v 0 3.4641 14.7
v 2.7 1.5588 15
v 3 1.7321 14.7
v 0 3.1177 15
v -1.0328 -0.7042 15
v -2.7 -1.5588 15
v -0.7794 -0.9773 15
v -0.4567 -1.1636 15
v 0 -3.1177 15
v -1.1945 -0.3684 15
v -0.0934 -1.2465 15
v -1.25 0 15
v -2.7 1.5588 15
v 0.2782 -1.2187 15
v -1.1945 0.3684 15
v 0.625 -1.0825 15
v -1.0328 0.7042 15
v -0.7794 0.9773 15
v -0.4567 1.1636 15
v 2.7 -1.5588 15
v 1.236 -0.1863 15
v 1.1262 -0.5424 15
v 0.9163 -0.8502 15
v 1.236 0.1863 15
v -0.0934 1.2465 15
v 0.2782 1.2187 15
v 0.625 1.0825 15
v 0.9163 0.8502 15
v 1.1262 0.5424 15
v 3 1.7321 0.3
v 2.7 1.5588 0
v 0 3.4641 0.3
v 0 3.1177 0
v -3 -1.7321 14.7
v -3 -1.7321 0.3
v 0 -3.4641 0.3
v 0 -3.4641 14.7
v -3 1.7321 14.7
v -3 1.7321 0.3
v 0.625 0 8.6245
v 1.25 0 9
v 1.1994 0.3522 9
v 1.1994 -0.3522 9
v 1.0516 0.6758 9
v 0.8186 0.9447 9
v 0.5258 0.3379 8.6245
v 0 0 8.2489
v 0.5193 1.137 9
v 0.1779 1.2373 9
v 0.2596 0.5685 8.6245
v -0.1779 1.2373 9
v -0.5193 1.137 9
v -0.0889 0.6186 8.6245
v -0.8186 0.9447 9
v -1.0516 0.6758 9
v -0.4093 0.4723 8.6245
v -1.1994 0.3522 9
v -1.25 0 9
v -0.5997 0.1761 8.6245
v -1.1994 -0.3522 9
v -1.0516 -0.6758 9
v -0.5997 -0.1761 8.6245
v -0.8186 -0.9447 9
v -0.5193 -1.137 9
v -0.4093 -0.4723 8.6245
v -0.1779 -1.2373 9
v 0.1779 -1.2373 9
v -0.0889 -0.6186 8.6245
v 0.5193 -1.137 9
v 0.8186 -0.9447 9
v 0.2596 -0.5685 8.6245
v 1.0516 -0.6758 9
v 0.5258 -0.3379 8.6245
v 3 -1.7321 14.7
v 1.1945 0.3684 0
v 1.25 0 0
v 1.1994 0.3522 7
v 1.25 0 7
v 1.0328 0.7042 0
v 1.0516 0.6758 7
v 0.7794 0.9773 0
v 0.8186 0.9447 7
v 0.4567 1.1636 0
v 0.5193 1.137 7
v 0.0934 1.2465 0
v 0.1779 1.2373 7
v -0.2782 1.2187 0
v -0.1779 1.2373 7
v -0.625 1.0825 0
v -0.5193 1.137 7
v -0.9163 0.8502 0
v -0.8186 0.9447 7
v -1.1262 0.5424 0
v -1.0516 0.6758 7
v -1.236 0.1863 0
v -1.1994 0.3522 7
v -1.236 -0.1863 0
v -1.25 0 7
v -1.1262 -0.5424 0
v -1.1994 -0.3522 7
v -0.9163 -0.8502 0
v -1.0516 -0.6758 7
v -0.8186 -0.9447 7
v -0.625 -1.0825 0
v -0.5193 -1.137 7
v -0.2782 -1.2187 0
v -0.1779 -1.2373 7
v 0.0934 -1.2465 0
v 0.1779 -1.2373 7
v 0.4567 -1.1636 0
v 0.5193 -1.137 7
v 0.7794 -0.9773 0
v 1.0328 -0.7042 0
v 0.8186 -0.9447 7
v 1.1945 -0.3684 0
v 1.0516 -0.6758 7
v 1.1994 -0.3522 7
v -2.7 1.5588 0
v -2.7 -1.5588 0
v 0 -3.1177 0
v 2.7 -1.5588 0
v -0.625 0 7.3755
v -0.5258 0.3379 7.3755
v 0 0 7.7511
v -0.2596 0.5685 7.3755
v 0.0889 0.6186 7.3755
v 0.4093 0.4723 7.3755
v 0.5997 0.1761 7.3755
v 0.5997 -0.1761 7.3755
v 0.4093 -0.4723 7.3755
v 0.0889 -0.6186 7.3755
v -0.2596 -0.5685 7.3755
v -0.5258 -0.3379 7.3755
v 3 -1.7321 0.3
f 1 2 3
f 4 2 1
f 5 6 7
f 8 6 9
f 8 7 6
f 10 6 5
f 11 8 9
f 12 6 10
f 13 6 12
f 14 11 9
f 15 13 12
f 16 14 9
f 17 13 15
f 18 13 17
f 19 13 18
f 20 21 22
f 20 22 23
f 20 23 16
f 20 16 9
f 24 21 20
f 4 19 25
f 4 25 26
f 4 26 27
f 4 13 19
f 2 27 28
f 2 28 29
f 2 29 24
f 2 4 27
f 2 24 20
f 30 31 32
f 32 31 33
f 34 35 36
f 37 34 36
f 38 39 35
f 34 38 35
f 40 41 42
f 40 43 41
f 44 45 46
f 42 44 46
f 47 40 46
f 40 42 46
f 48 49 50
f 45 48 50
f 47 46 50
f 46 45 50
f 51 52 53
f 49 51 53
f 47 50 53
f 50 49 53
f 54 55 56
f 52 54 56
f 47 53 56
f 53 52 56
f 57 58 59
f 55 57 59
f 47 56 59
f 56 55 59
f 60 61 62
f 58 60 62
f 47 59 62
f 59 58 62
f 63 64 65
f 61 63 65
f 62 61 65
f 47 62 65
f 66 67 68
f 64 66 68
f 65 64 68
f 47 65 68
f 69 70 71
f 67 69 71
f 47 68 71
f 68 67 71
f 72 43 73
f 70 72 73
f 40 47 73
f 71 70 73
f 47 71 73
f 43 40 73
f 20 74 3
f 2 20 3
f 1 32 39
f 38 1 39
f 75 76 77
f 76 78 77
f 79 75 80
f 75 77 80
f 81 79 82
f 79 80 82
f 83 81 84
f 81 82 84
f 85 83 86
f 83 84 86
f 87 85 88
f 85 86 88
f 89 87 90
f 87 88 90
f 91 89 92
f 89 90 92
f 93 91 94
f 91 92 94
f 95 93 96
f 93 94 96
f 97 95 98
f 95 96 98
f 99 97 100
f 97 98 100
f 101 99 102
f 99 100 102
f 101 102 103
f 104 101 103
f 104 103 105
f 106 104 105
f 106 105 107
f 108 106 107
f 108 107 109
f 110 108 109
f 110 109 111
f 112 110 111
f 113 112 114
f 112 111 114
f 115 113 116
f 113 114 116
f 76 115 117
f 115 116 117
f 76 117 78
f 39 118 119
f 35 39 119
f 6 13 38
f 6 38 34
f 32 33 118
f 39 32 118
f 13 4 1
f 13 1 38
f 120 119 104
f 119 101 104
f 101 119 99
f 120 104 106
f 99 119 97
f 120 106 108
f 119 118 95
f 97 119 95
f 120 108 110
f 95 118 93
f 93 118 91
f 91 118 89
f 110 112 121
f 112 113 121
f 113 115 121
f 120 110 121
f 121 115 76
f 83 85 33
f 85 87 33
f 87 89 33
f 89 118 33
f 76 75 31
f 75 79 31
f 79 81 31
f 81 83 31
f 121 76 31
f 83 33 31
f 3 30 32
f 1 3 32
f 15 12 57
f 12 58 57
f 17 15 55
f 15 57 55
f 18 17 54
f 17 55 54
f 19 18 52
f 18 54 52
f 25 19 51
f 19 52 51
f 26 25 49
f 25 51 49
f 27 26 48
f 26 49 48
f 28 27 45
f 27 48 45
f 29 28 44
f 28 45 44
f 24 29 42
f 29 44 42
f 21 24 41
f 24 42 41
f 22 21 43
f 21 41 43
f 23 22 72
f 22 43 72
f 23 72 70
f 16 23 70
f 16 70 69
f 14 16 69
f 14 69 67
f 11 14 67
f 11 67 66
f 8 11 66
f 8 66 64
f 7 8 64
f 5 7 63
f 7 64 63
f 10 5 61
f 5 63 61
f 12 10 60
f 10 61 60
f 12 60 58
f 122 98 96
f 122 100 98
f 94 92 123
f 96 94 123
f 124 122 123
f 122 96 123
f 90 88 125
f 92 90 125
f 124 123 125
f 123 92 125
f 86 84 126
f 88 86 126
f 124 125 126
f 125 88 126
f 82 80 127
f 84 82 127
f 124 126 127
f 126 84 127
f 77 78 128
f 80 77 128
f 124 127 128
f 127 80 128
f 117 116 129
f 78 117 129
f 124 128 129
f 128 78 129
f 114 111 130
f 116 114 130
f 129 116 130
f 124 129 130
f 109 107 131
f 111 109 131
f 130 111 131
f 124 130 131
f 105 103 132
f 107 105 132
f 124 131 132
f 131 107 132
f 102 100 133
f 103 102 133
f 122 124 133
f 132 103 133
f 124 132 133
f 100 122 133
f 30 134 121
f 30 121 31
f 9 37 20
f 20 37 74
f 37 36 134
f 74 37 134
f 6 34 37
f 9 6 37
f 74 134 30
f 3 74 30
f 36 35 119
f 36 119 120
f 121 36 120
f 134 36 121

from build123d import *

# Parameters (mm, degrees)
BOSS_EXTRUDE1_DEPTH   = 15
M3_TAPPED_HOLE1_D     = 2.5
M3_TAPPED_HOLE1_DEPTH = 6
M3_TAPPED_HOLE1_TIP   = 0.751075774
M3_TAPPED_HOLE2_D     = 2.5
M3_TAPPED_HOLE2_DEPTH = 7
M3_TAPPED_HOLE2_TIP   = 0.751075774
CHAMFER1_SIZE         = 0.3


with BuildPart() as part:
    # Sketch1 → Boss-Extrude1 (new body)
    with BuildSketch(Plane.XY):
        Polygon((0, 3.464101615), (-3, 1.732050808), (-3, -1.732050808), (0, -3.464101615), (3, -1.732050808), (3, 1.732050808), align=None)
    extrude(amount=BOSS_EXTRUDE1_DEPTH)

    # M3 Tapped Hole1
    with Locations(Plane.XY.offset(15)):
        with Locations((0, 0)):
            Hole(M3_TAPPED_HOLE1_D / 2, depth=M3_TAPPED_HOLE1_DEPTH)
            with Locations((0, 0, -(M3_TAPPED_HOLE1_DEPTH + M3_TAPPED_HOLE1_TIP / 2))):  # 118° drill point
                Cone(0, M3_TAPPED_HOLE1_D / 2, M3_TAPPED_HOLE1_TIP, mode=Mode.SUBTRACT)

    # M3 Tapped Hole2
    with Locations(Plane(origin=(0, 0, 0), x_dir=(-1, 0, 0), z_dir=(0, 0, -1))):
        with Locations((0, 0)):
            Hole(M3_TAPPED_HOLE2_D / 2, depth=M3_TAPPED_HOLE2_DEPTH)
            with Locations((0, 0, -(M3_TAPPED_HOLE2_DEPTH + M3_TAPPED_HOLE2_TIP / 2))):  # 118° drill point
                Cone(0, M3_TAPPED_HOLE2_D / 2, M3_TAPPED_HOLE2_TIP, mode=Mode.SUBTRACT)

    # Chamfer1
    chamfer1_edges = [part.edges().sort_by_distance(p)[0] for p in [
        (-3, 0, 15),
        (-1.5, -2.598076211, 15),
        (1.5, -2.598076211, 15),
        (3, 0, 15),
        (1.5, 2.598076211, 15),
        (3, 0, 0),
        (1.5, -2.598076211, 0),
        (-1.5, -2.598076211, 0),
        (-1.5, 2.598076211, 15),
        (-3, 0, 0),
        (-1.5, 2.598076211, 0),
        (1.5, 2.598076211, 0),
    ]]
    chamfer(chamfer1_edges, length=CHAMFER1_SIZE)


solid = part.part
